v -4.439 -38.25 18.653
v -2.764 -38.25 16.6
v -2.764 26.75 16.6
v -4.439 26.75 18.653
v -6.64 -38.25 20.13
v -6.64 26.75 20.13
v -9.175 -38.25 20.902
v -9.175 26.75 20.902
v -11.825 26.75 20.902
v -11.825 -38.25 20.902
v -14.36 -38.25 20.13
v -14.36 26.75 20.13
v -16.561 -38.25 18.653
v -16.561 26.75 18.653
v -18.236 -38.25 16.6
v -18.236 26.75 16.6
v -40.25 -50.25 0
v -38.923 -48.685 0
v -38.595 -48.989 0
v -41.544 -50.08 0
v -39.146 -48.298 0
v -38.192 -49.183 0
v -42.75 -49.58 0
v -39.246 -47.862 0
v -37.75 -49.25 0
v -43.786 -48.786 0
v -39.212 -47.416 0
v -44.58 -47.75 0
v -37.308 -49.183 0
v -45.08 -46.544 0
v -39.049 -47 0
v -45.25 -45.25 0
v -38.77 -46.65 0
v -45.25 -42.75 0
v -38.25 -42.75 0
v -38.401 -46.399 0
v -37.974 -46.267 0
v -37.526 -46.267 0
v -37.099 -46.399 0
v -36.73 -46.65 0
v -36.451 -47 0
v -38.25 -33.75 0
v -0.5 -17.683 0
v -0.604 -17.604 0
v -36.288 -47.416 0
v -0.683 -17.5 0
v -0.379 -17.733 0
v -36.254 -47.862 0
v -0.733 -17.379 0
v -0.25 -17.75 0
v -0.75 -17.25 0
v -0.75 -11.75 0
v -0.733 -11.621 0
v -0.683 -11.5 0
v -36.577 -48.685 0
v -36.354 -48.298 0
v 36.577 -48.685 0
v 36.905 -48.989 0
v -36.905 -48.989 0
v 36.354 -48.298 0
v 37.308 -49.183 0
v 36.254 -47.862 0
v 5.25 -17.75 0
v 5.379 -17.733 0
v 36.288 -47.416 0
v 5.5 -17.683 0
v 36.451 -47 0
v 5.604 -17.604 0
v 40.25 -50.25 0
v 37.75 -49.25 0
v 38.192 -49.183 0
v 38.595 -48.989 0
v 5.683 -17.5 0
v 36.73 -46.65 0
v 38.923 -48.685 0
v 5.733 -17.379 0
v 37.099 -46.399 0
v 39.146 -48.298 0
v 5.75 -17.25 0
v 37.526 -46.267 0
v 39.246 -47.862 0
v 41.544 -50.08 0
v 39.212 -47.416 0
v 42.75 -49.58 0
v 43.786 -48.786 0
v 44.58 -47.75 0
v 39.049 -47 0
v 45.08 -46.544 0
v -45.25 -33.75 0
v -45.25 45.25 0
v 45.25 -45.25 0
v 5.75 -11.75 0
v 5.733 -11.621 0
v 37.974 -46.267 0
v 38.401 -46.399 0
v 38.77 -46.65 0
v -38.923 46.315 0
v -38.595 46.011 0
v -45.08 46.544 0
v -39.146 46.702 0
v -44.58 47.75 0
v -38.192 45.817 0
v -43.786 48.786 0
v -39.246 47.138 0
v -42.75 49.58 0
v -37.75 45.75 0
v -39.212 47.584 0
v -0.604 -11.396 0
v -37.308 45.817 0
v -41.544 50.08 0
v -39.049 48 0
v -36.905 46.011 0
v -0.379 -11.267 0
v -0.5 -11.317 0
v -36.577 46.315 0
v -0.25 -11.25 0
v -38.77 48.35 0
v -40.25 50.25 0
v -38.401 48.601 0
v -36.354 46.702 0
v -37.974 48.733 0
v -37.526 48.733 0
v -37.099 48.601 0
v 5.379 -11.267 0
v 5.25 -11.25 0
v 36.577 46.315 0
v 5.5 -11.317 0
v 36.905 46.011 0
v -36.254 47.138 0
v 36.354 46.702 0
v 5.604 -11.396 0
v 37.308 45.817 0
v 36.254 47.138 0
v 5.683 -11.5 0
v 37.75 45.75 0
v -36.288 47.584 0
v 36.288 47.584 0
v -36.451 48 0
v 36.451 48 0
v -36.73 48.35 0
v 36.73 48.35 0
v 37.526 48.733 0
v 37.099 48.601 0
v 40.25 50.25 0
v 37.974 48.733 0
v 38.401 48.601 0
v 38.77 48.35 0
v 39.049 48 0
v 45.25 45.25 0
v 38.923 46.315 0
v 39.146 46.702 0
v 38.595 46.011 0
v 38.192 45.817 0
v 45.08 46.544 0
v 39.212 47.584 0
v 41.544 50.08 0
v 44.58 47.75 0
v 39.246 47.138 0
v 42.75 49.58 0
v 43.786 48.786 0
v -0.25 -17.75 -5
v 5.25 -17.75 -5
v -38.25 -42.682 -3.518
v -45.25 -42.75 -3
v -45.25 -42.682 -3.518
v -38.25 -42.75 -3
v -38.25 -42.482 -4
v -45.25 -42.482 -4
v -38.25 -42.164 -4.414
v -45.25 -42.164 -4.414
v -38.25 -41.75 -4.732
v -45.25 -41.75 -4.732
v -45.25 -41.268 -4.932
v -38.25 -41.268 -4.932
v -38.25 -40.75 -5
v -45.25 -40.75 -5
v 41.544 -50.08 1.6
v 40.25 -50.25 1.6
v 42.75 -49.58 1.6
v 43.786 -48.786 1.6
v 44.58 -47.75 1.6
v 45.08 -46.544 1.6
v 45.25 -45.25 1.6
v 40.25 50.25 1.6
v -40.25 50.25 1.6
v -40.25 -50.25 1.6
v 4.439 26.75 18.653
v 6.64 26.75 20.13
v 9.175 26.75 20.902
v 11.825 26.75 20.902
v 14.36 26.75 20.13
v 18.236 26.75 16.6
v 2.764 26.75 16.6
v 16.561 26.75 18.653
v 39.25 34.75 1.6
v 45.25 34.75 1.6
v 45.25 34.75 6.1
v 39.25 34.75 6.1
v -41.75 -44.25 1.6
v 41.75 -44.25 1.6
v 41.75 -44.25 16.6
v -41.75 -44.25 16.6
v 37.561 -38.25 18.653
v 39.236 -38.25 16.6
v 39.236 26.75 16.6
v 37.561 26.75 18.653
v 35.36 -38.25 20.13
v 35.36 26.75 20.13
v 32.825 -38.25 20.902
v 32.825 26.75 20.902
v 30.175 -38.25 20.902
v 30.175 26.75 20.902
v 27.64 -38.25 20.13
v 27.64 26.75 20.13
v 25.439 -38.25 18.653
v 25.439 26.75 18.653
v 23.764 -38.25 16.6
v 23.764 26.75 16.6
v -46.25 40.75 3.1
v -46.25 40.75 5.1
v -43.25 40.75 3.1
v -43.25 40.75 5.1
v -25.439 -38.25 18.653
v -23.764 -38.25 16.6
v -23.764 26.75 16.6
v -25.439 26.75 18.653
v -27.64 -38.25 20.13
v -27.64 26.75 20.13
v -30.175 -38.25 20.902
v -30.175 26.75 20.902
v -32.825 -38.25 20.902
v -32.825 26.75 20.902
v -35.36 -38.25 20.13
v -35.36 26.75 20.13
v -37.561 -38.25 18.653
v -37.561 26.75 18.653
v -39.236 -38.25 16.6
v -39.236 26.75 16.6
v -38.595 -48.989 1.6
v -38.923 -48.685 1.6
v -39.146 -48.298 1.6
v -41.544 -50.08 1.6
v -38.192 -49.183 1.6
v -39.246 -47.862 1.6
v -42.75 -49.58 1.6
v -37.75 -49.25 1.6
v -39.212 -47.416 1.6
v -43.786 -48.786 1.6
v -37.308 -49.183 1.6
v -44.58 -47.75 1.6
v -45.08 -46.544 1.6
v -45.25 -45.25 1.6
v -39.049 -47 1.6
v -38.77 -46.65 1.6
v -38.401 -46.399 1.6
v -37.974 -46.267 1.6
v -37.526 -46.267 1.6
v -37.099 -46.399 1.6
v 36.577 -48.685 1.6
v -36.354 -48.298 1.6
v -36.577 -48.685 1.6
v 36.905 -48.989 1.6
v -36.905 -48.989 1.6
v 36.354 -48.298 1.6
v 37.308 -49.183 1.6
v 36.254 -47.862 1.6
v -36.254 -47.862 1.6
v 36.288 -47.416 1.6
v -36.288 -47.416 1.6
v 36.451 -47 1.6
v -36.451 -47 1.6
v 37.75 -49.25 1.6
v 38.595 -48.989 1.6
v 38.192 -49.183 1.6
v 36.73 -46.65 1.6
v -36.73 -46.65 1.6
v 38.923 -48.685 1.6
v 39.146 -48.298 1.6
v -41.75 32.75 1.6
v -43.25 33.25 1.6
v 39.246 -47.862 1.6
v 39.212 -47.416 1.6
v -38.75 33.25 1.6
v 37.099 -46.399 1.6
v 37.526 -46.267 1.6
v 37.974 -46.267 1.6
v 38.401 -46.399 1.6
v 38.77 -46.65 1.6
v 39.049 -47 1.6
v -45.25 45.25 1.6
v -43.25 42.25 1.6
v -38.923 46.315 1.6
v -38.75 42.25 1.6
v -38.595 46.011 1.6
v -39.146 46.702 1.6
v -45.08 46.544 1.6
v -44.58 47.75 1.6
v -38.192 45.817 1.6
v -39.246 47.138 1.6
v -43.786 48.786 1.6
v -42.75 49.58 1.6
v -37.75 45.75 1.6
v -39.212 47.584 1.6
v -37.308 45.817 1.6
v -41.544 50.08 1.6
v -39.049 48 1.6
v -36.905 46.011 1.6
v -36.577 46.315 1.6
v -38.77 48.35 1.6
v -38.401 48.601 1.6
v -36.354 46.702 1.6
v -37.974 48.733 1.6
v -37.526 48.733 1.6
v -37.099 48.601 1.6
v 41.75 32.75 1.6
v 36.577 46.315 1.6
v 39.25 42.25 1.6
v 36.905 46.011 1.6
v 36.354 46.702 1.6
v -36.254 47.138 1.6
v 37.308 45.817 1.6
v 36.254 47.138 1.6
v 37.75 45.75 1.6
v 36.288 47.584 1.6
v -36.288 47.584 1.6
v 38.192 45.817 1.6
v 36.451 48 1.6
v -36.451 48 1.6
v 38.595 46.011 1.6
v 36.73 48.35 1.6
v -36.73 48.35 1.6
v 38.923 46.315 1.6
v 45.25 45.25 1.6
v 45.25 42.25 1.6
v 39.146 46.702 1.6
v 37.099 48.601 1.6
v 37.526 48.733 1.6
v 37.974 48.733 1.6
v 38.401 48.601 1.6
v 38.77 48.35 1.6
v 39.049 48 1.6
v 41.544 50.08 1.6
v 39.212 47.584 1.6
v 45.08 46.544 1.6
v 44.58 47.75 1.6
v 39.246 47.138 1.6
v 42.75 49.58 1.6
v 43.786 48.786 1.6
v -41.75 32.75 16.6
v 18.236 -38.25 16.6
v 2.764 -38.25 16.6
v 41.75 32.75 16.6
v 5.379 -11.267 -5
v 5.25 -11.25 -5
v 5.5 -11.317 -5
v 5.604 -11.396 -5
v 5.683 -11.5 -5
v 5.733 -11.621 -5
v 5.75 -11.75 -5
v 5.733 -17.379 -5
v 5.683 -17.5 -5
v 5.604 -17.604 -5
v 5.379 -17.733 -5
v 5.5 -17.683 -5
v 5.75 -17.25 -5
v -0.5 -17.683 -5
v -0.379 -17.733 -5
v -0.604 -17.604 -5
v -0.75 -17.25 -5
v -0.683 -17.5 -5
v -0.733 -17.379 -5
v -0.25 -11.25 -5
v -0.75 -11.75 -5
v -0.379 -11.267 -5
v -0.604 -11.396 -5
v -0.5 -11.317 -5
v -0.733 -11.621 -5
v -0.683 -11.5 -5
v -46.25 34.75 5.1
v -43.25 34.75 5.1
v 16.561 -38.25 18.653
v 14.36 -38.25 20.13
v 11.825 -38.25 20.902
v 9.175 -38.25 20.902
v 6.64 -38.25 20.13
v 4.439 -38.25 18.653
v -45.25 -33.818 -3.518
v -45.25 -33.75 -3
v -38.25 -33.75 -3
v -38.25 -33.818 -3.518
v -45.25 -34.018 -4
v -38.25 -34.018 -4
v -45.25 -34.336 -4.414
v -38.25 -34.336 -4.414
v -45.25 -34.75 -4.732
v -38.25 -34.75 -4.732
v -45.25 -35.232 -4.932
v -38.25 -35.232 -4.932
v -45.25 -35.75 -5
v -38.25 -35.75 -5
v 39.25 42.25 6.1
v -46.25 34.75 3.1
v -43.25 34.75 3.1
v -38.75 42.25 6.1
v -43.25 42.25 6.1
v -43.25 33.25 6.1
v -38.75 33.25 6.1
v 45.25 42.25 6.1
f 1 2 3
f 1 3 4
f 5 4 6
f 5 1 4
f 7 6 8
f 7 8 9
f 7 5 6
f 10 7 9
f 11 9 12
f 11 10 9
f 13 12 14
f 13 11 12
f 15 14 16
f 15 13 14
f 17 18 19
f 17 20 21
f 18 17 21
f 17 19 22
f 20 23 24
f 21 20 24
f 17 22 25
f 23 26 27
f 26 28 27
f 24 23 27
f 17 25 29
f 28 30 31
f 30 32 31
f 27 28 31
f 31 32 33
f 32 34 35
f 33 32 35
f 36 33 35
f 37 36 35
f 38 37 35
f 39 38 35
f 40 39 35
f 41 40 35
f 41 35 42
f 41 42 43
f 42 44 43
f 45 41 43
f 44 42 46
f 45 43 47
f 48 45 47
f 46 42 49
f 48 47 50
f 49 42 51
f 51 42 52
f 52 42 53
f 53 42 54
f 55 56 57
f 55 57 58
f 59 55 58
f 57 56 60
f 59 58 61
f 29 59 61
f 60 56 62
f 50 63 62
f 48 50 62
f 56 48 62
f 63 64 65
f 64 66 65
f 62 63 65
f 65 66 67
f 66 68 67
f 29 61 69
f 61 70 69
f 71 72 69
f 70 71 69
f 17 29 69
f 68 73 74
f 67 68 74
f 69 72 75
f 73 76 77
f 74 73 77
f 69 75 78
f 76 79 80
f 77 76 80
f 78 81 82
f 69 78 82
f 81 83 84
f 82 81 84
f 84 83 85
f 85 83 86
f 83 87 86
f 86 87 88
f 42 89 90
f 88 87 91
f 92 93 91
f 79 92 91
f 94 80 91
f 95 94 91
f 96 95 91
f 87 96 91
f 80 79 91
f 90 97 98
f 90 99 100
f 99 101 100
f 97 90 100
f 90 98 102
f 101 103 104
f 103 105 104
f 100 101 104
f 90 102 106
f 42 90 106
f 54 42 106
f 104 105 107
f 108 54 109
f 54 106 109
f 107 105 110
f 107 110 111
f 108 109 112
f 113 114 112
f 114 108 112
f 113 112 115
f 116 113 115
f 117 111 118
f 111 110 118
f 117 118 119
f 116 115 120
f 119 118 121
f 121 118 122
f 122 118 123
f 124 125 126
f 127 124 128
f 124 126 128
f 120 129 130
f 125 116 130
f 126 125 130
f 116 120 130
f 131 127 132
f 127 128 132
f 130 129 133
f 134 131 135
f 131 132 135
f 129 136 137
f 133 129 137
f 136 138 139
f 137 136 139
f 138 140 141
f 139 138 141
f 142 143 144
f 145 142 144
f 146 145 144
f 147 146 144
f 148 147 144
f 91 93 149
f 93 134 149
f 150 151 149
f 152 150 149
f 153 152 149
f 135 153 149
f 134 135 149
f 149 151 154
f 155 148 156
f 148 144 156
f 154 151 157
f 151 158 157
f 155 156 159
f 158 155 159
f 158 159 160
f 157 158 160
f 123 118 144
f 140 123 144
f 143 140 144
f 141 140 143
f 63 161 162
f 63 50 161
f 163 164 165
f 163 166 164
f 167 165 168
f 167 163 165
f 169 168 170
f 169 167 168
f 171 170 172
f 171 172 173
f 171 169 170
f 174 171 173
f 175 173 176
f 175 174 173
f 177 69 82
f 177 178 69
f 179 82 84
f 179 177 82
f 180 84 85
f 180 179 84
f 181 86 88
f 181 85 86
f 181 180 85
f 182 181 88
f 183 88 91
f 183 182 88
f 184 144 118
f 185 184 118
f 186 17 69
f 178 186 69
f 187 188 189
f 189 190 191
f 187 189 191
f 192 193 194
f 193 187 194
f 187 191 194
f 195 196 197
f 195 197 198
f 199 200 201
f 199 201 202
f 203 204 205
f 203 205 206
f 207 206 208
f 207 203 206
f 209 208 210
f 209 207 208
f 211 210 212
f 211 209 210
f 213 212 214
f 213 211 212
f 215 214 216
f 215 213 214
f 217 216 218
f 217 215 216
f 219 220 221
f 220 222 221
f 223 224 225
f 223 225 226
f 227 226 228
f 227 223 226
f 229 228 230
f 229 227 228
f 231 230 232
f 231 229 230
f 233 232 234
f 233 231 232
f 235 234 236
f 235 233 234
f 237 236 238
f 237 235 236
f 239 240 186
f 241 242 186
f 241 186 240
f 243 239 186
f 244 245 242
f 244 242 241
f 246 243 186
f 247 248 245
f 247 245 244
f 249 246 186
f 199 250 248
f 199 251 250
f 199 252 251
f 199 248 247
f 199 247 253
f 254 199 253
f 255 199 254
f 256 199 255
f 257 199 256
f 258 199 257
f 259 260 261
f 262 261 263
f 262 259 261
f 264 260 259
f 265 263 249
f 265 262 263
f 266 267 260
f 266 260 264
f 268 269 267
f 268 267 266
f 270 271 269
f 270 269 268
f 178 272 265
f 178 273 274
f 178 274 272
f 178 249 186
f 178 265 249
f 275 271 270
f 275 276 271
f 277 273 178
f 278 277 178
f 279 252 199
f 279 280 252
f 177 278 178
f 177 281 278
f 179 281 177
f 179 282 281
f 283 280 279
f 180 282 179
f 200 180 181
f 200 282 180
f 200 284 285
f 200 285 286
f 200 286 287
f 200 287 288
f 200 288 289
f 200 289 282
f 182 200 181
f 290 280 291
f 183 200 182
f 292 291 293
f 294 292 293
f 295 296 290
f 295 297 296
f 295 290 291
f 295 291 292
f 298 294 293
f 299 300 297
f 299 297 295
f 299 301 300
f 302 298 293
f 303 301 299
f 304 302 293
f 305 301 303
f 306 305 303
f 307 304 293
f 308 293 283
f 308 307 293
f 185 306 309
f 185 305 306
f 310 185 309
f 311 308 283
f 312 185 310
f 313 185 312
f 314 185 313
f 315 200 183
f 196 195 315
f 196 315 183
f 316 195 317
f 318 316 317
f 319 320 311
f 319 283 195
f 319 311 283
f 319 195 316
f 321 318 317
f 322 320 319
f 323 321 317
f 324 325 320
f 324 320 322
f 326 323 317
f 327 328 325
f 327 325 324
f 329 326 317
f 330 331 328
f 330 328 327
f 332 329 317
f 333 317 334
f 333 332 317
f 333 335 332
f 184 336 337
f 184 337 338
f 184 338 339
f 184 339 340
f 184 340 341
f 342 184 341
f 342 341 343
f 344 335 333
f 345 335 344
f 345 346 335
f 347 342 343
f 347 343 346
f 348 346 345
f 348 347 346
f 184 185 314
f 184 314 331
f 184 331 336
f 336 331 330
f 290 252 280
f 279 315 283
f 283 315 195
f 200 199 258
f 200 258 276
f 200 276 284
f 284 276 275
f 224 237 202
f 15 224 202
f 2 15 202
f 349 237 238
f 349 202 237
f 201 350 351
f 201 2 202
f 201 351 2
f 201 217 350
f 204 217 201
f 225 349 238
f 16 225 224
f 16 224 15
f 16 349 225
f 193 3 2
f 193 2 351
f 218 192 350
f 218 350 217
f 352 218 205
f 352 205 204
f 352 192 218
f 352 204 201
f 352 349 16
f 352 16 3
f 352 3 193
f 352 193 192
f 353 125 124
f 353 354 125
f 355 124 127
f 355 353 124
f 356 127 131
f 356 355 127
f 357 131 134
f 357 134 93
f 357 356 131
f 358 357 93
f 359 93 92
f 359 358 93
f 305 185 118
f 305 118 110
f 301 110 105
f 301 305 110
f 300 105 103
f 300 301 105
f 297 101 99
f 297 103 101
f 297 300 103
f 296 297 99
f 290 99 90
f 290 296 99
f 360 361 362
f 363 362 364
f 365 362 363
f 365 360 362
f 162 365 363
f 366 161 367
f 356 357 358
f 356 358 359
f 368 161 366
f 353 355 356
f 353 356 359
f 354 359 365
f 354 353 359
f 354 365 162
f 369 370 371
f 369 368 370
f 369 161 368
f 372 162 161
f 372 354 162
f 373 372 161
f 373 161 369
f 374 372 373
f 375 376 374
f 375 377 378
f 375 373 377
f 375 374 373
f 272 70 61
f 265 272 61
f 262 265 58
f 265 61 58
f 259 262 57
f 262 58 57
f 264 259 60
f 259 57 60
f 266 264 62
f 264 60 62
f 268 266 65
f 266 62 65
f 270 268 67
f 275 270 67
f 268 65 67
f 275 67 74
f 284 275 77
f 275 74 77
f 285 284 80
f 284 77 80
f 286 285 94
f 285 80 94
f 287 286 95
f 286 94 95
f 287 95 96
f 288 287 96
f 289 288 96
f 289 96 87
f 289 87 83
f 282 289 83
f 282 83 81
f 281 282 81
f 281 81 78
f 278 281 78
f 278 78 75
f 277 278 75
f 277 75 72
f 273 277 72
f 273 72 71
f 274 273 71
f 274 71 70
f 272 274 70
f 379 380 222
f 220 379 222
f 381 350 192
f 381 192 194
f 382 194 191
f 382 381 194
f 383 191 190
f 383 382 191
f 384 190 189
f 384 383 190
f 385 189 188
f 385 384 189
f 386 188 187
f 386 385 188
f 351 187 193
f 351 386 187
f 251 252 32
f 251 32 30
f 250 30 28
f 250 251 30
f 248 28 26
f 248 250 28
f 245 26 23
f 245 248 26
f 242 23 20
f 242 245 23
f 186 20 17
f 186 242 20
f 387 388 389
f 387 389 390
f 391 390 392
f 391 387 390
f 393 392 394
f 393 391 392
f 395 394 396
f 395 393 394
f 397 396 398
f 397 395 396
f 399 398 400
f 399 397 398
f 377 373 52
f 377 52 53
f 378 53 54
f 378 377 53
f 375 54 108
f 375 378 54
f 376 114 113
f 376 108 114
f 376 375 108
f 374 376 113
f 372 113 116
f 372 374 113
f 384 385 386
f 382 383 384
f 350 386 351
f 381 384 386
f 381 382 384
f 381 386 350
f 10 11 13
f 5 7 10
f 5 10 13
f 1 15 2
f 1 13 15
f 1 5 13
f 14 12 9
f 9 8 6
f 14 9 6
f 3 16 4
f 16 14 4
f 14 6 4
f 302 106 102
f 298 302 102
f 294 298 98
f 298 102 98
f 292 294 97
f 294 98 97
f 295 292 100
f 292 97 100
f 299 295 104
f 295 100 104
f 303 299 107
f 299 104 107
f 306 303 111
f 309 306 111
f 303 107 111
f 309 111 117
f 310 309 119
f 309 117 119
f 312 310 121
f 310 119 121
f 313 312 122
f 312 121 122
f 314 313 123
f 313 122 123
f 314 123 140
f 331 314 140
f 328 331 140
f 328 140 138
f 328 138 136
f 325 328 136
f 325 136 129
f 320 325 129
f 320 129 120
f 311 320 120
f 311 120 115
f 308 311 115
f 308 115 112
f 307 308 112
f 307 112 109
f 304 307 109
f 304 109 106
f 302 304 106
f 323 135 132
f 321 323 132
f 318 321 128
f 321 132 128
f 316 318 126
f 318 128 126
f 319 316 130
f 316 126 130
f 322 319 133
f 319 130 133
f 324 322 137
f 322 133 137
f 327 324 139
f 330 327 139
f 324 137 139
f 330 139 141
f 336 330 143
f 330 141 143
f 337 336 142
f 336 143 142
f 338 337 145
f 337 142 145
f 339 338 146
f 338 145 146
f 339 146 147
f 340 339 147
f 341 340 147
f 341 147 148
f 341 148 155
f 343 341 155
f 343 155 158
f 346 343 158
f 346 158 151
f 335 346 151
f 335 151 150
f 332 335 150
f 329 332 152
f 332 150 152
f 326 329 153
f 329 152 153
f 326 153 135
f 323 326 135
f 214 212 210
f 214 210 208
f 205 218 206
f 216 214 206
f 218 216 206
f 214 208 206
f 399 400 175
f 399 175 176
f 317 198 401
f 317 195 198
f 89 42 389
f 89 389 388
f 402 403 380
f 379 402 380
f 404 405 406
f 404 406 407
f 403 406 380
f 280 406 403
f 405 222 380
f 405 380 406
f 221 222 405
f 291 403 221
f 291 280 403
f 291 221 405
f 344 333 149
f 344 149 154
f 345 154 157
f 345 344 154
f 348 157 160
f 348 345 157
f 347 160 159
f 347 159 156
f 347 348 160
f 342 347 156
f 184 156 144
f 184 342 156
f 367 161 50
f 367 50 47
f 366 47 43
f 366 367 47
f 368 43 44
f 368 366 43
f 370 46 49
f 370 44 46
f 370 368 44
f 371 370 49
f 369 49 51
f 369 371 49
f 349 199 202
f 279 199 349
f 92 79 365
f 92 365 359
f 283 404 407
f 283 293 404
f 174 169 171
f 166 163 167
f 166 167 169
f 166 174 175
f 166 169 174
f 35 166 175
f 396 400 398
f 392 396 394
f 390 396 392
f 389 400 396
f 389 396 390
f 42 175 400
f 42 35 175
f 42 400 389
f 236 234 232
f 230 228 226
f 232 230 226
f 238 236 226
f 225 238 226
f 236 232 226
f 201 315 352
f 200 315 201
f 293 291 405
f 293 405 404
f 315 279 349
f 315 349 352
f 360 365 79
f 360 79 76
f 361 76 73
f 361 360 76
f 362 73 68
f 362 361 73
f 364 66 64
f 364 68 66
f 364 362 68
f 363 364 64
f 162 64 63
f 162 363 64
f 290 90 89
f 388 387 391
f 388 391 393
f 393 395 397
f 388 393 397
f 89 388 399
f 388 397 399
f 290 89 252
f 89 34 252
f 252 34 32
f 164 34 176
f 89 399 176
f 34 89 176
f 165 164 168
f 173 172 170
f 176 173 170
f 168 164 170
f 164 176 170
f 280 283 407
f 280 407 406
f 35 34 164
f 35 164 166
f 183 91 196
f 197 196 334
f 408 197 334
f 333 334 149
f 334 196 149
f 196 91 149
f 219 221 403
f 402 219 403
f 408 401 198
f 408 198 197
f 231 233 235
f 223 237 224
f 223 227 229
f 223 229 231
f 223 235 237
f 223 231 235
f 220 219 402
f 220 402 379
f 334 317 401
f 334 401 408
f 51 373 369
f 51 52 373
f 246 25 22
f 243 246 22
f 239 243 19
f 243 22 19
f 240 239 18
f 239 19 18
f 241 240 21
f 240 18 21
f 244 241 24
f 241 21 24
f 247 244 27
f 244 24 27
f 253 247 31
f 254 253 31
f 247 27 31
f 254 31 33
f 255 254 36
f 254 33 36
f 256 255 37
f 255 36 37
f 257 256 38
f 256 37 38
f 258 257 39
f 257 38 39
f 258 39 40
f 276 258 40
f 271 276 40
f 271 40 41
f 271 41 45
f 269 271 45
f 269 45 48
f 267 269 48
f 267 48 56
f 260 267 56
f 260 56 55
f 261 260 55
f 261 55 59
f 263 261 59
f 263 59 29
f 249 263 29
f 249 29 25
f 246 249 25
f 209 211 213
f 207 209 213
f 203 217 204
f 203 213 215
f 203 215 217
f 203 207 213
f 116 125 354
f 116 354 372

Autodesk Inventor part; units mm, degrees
ref_plane "YZ Plane" through (0, 0, 0) normal (1, 0, 0) x (0, 1, 0)
ref_plane "XZ Plane" through (0, 0, 0) normal (0, 1, 0) x (-1, 0, 0)
sketch "Skizze1" plane through (0, 0, 0) normal (0, 0, 1) x (1, 0, 0)
  line L0 (45.25, 50.25) -> (-45.25, 50.25)
  line L1 (-45.25, 50.25) -> (-45.25, -50.25)
  line L2 (-45.25, -50.25) -> (45.25, -50.25)
  line L3 (45.25, -50.25) -> (45.25, 50.25)
  line L4 (45.25, 50.25) -> (-45.25, -50.25) construction
  line L5 (-45.25, 50.25) -> (45.25, -50.25) construction
  point P0 (0, 0)
  dimension "d0" = 90.5
  dimension "d1" = 100.5
extrude "Extrusion1" add sketch "Skizze1" along normal blind 1.6
fillet "Rundung1" radius 5 4 edges at (45.25, 50.25, 0.8) (-45.25, 50.25, 0.8) (45.25, -50.25, 0.8) (-45.25, -50.25, 0.8)
sketch "Skizze2" plane through (0, 0, 0) normal (0, 0, -1) x (-1, 0, 0)
  line L0 (-5.75, -11.25) -> (0.75, -11.25)
  line L1 (0.75, -11.25) -> (0.75, -17.75)
  line L2 (0.75, -17.75) -> (-5.75, -17.75)
  line L3 (-5.75, -17.75) -> (-5.75, -11.25)
  line L4 (-5.75, -11.25) -> (0.75, -17.75) construction
  line L5 (0.75, -11.25) -> (-5.75, -17.75) construction
  line L6 (40.25, -50.25) -> (-40.25, -50.25) projected
  line L7 (-45.25, -45.25) -> (-45.25, 45.25) projected
  point P0 (0, 0)
  point P1 (-2.5, -14.5)
  point P2 (-2.5, -17.75)
  dimension "d5" = 32.5
  dimension "d6" = 39.5
  dimension "d7" = 6.5
  dimension "d8" = 6.5
extrude "Extrusion2" add sketch "Skizze2" along normal blind 5
fillet "Rundung2" radius 0.5 4 edges at (-0.75, -11.25, -2.5) (-0.75, -17.75, -2.5) (5.75, -17.75, -2.5) (5.75, -11.25, -2.5)
sketch "Skizze3" plane through (0, 0, 0) normal (0, 0, -1) x (-1, 0, 0)
  line L0 (38.25, -33.75) -> (45.25, -33.75)
  line L1 (45.25, -33.75) -> (45.25, -42.75)
  line L2 (45.25, -42.75) -> (38.25, -42.75)
  line L3 (38.25, -42.75) -> (38.25, -33.75)
  line L4 (38.25, -33.75) -> (45.25, -42.75) construction
  line L5 (45.25, -33.75) -> (38.25, -42.75) construction
  line L6 (40.25, -50.25) -> (-40.25, -50.25) projected
  line L7 (45.25, 45.25) -> (45.25, -45.25) projected
  point P0 (0, 0)
  point P1 (41.75, -38.25)
  dimension "d12" = 7.5
  dimension "d13" = 7
  dimension "d14" = 9
extrude "Extrusion3" add sketch "Skizze3" along normal blind 5
fillet "Rundung3" radius 2 2 edges at (-41.75, -33.75, -5) (-41.75, -42.75, -5)
sketch "Skizze4" plane through (0, 0, 1.6) normal (0, 0, 1) x (1, 0, 0)
  line L0 (39.25, 42.25) -> (45.25, 42.25)
  line L1 (45.25, 42.25) -> (45.25, 34.75)
  line L2 (45.25, 34.75) -> (39.25, 34.75)
  line L3 (39.25, 34.75) -> (39.25, 42.25)
  line L4 (39.25, 42.25) -> (45.25, 34.75) construction
  line L5 (45.25, 42.25) -> (39.25, 34.75) construction
  line L6 (45.25, -45.25) -> (45.25, 45.25) projected
  line L7 (-45.25, 45.25) -> (-45.25, -45.25) projected
  line L8 (40.25, 50.25) -> (-40.25, 50.25) projected
  line L9 (-43.25, 42.25) -> (-38.75, 42.25)
  line L10 (-38.75, 42.25) -> (-38.75, 33.25)
  line L11 (-38.75, 33.25) -> (-43.25, 33.25)
  line L12 (-43.25, 33.25) -> (-43.25, 42.25)
  line L13 (-43.25, 42.25) -> (-38.75, 33.25) construction
  line L14 (-38.75, 42.25) -> (-43.25, 33.25) construction
  point P0 (0, 0)
  point P1 (42.25, 38.5)
  point P2 (42.25, 42.25)
  point P3 (-41, 37.75)
  dimension "d19" = 8
  dimension "d20" = 7.5
  dimension "d21" = 6
  dimension "d22" = 8
  dimension "d23" = 9
  dimension "d24" = 4.5
  dimension "d25" = 2
extrude "Extrusion4" add sketch "Skizze4" along normal blind 4.5
sketch "Skizze5" plane through (-43.25, 33.25, 1.6) normal (-1, 0, 0) x (0, 0, 1)
  line L0 (1.5, 1.5) -> (3.5, 1.5)
  line L1 (3.5, 1.5) -> (3.5, 7.5)
  line L2 (3.5, 7.5) -> (1.5, 7.5)
  line L3 (1.5, 7.5) -> (1.5, 1.5)
  line L4 (1.5, 1.5) -> (3.5, 7.5) construction
  line L5 (3.5, 1.5) -> (1.5, 7.5) construction
  line L6 (0, 9) -> (4.5, 9) projected
  line L7 (4.5, 9) -> (4.5, 0) projected
  point P0 (-1.6, -33.25)
  point P1 (2.5, 4.5)
  dimension "d28" = 1.5
  dimension "d29" = 6
  dimension "d30" = 1
  dimension "d31" = 2
extrude "Extrusion5" add sketch "Skizze5" along normal blind 3
sketch "Skizze6" plane through (0, 0, 1.6) normal (0, 0, 1) x (1, 0, 0)
  line L0 (-41.75, 32.75) -> (41.75, 32.75)
  line L1 (41.75, 32.75) -> (41.75, -44.25)
  line L2 (41.75, -44.25) -> (-41.75, -44.25)
  line L3 (-41.75, -44.25) -> (-41.75, 32.75)
  line L4 (-41.75, 32.75) -> (41.75, -44.25) construction
  line L5 (41.75, 32.75) -> (-41.75, -44.25) construction
  line L6 (-40.25, -50.25) -> (40.25, -50.25) projected
  line L7 (-45.25, 45.25) -> (-45.25, -45.25) projected
  line L8 (45.25, -45.25) -> (45.25, 34.75) projected
  point P0 (0, 0)
  point P1 (0, -5.75)
  dimension "d34" = 6
  dimension "d35" = 3.5
  dimension "d36" = 3.5
  dimension "d37" = 77
extrude "Extrusion6" add sketch "Skizze6" along normal blind 15
ref_plane "Arbeitsebene1" through (-41.75, -38.25, 1.6) normal (0, -1, 0) x (1, 0, 0)
sketch "Skizze7" plane through (-41.75, -38.25, 1.6) normal (0, -1, 0) x (1, 0, 0)
  circle A0 centre (10.25, 10.4) radius 9
  circle A1 centre (31.25, 10.4) radius 9
  circle A2 centre (52.25, 10.4) radius 9
  circle A3 centre (73.25, 10.4) radius 9
  line L0 (1.5, -1.6) -> (82, -1.6) projected
  line L1 (10.25, 10.4) -> (114.75, 10.4) construction
  line L2 (0, 0) -> (83.5, 0) construction
  point P0 (41.75, -1.6)
  point P1 (62.5, 10.4)
  point P2 (41.75, 0)
  dimension "d41" = 18
  dimension "d42" = 18
  dimension "d43" = 18
  dimension "d44" = 18
  dimension "d45" = 21
  dimension "d46" = 21
  dimension "d47" = 21
  dimension "d49" = 31.5
  dimension "d50" = 21
extrude "Extrusion7" add sketch "Skizze7" against normal blind 65
sketch "Skizze8" plane through (0, 0, 1.6) normal (0, 0, 1) x (1, 0, 0)
  line L0 (-37.75, 47.25) -> (37.75, 47.25)
  line L1 (37.75, 47.25) -> (37.75, -47.75)
  line L2 (37.75, -47.75) -> (-37.75, -47.75)
  line L3 (-37.75, -47.75) -> (-37.75, 47.25)
  line L4 (41.75, 32.75) -> (-41.75, 32.75) projected
  line L5 (40.25, 50.25) -> (-40.25, 50.25) projected
  point P0 (0, 0)
  point P1 (0, 32.75)
  point P2 (0, 47.25)
  dimension "d53" = 95
  dimension "d54" = 75.5
  dimension "d55" = 0
  dimension "d56" = 3
hole "Bohrung1" at (-37.75, 47.25, 1.6) at (37.75, 47.25, 1.6) at (-37.75, -47.75, 1.6) at (37.75, -47.75, 1.6) direction (0, 0, -1) diameter 3 depth 1.6
equation "\"d49\" = 1.5 * d46"
properties part number "010_Battery_2Cell"
